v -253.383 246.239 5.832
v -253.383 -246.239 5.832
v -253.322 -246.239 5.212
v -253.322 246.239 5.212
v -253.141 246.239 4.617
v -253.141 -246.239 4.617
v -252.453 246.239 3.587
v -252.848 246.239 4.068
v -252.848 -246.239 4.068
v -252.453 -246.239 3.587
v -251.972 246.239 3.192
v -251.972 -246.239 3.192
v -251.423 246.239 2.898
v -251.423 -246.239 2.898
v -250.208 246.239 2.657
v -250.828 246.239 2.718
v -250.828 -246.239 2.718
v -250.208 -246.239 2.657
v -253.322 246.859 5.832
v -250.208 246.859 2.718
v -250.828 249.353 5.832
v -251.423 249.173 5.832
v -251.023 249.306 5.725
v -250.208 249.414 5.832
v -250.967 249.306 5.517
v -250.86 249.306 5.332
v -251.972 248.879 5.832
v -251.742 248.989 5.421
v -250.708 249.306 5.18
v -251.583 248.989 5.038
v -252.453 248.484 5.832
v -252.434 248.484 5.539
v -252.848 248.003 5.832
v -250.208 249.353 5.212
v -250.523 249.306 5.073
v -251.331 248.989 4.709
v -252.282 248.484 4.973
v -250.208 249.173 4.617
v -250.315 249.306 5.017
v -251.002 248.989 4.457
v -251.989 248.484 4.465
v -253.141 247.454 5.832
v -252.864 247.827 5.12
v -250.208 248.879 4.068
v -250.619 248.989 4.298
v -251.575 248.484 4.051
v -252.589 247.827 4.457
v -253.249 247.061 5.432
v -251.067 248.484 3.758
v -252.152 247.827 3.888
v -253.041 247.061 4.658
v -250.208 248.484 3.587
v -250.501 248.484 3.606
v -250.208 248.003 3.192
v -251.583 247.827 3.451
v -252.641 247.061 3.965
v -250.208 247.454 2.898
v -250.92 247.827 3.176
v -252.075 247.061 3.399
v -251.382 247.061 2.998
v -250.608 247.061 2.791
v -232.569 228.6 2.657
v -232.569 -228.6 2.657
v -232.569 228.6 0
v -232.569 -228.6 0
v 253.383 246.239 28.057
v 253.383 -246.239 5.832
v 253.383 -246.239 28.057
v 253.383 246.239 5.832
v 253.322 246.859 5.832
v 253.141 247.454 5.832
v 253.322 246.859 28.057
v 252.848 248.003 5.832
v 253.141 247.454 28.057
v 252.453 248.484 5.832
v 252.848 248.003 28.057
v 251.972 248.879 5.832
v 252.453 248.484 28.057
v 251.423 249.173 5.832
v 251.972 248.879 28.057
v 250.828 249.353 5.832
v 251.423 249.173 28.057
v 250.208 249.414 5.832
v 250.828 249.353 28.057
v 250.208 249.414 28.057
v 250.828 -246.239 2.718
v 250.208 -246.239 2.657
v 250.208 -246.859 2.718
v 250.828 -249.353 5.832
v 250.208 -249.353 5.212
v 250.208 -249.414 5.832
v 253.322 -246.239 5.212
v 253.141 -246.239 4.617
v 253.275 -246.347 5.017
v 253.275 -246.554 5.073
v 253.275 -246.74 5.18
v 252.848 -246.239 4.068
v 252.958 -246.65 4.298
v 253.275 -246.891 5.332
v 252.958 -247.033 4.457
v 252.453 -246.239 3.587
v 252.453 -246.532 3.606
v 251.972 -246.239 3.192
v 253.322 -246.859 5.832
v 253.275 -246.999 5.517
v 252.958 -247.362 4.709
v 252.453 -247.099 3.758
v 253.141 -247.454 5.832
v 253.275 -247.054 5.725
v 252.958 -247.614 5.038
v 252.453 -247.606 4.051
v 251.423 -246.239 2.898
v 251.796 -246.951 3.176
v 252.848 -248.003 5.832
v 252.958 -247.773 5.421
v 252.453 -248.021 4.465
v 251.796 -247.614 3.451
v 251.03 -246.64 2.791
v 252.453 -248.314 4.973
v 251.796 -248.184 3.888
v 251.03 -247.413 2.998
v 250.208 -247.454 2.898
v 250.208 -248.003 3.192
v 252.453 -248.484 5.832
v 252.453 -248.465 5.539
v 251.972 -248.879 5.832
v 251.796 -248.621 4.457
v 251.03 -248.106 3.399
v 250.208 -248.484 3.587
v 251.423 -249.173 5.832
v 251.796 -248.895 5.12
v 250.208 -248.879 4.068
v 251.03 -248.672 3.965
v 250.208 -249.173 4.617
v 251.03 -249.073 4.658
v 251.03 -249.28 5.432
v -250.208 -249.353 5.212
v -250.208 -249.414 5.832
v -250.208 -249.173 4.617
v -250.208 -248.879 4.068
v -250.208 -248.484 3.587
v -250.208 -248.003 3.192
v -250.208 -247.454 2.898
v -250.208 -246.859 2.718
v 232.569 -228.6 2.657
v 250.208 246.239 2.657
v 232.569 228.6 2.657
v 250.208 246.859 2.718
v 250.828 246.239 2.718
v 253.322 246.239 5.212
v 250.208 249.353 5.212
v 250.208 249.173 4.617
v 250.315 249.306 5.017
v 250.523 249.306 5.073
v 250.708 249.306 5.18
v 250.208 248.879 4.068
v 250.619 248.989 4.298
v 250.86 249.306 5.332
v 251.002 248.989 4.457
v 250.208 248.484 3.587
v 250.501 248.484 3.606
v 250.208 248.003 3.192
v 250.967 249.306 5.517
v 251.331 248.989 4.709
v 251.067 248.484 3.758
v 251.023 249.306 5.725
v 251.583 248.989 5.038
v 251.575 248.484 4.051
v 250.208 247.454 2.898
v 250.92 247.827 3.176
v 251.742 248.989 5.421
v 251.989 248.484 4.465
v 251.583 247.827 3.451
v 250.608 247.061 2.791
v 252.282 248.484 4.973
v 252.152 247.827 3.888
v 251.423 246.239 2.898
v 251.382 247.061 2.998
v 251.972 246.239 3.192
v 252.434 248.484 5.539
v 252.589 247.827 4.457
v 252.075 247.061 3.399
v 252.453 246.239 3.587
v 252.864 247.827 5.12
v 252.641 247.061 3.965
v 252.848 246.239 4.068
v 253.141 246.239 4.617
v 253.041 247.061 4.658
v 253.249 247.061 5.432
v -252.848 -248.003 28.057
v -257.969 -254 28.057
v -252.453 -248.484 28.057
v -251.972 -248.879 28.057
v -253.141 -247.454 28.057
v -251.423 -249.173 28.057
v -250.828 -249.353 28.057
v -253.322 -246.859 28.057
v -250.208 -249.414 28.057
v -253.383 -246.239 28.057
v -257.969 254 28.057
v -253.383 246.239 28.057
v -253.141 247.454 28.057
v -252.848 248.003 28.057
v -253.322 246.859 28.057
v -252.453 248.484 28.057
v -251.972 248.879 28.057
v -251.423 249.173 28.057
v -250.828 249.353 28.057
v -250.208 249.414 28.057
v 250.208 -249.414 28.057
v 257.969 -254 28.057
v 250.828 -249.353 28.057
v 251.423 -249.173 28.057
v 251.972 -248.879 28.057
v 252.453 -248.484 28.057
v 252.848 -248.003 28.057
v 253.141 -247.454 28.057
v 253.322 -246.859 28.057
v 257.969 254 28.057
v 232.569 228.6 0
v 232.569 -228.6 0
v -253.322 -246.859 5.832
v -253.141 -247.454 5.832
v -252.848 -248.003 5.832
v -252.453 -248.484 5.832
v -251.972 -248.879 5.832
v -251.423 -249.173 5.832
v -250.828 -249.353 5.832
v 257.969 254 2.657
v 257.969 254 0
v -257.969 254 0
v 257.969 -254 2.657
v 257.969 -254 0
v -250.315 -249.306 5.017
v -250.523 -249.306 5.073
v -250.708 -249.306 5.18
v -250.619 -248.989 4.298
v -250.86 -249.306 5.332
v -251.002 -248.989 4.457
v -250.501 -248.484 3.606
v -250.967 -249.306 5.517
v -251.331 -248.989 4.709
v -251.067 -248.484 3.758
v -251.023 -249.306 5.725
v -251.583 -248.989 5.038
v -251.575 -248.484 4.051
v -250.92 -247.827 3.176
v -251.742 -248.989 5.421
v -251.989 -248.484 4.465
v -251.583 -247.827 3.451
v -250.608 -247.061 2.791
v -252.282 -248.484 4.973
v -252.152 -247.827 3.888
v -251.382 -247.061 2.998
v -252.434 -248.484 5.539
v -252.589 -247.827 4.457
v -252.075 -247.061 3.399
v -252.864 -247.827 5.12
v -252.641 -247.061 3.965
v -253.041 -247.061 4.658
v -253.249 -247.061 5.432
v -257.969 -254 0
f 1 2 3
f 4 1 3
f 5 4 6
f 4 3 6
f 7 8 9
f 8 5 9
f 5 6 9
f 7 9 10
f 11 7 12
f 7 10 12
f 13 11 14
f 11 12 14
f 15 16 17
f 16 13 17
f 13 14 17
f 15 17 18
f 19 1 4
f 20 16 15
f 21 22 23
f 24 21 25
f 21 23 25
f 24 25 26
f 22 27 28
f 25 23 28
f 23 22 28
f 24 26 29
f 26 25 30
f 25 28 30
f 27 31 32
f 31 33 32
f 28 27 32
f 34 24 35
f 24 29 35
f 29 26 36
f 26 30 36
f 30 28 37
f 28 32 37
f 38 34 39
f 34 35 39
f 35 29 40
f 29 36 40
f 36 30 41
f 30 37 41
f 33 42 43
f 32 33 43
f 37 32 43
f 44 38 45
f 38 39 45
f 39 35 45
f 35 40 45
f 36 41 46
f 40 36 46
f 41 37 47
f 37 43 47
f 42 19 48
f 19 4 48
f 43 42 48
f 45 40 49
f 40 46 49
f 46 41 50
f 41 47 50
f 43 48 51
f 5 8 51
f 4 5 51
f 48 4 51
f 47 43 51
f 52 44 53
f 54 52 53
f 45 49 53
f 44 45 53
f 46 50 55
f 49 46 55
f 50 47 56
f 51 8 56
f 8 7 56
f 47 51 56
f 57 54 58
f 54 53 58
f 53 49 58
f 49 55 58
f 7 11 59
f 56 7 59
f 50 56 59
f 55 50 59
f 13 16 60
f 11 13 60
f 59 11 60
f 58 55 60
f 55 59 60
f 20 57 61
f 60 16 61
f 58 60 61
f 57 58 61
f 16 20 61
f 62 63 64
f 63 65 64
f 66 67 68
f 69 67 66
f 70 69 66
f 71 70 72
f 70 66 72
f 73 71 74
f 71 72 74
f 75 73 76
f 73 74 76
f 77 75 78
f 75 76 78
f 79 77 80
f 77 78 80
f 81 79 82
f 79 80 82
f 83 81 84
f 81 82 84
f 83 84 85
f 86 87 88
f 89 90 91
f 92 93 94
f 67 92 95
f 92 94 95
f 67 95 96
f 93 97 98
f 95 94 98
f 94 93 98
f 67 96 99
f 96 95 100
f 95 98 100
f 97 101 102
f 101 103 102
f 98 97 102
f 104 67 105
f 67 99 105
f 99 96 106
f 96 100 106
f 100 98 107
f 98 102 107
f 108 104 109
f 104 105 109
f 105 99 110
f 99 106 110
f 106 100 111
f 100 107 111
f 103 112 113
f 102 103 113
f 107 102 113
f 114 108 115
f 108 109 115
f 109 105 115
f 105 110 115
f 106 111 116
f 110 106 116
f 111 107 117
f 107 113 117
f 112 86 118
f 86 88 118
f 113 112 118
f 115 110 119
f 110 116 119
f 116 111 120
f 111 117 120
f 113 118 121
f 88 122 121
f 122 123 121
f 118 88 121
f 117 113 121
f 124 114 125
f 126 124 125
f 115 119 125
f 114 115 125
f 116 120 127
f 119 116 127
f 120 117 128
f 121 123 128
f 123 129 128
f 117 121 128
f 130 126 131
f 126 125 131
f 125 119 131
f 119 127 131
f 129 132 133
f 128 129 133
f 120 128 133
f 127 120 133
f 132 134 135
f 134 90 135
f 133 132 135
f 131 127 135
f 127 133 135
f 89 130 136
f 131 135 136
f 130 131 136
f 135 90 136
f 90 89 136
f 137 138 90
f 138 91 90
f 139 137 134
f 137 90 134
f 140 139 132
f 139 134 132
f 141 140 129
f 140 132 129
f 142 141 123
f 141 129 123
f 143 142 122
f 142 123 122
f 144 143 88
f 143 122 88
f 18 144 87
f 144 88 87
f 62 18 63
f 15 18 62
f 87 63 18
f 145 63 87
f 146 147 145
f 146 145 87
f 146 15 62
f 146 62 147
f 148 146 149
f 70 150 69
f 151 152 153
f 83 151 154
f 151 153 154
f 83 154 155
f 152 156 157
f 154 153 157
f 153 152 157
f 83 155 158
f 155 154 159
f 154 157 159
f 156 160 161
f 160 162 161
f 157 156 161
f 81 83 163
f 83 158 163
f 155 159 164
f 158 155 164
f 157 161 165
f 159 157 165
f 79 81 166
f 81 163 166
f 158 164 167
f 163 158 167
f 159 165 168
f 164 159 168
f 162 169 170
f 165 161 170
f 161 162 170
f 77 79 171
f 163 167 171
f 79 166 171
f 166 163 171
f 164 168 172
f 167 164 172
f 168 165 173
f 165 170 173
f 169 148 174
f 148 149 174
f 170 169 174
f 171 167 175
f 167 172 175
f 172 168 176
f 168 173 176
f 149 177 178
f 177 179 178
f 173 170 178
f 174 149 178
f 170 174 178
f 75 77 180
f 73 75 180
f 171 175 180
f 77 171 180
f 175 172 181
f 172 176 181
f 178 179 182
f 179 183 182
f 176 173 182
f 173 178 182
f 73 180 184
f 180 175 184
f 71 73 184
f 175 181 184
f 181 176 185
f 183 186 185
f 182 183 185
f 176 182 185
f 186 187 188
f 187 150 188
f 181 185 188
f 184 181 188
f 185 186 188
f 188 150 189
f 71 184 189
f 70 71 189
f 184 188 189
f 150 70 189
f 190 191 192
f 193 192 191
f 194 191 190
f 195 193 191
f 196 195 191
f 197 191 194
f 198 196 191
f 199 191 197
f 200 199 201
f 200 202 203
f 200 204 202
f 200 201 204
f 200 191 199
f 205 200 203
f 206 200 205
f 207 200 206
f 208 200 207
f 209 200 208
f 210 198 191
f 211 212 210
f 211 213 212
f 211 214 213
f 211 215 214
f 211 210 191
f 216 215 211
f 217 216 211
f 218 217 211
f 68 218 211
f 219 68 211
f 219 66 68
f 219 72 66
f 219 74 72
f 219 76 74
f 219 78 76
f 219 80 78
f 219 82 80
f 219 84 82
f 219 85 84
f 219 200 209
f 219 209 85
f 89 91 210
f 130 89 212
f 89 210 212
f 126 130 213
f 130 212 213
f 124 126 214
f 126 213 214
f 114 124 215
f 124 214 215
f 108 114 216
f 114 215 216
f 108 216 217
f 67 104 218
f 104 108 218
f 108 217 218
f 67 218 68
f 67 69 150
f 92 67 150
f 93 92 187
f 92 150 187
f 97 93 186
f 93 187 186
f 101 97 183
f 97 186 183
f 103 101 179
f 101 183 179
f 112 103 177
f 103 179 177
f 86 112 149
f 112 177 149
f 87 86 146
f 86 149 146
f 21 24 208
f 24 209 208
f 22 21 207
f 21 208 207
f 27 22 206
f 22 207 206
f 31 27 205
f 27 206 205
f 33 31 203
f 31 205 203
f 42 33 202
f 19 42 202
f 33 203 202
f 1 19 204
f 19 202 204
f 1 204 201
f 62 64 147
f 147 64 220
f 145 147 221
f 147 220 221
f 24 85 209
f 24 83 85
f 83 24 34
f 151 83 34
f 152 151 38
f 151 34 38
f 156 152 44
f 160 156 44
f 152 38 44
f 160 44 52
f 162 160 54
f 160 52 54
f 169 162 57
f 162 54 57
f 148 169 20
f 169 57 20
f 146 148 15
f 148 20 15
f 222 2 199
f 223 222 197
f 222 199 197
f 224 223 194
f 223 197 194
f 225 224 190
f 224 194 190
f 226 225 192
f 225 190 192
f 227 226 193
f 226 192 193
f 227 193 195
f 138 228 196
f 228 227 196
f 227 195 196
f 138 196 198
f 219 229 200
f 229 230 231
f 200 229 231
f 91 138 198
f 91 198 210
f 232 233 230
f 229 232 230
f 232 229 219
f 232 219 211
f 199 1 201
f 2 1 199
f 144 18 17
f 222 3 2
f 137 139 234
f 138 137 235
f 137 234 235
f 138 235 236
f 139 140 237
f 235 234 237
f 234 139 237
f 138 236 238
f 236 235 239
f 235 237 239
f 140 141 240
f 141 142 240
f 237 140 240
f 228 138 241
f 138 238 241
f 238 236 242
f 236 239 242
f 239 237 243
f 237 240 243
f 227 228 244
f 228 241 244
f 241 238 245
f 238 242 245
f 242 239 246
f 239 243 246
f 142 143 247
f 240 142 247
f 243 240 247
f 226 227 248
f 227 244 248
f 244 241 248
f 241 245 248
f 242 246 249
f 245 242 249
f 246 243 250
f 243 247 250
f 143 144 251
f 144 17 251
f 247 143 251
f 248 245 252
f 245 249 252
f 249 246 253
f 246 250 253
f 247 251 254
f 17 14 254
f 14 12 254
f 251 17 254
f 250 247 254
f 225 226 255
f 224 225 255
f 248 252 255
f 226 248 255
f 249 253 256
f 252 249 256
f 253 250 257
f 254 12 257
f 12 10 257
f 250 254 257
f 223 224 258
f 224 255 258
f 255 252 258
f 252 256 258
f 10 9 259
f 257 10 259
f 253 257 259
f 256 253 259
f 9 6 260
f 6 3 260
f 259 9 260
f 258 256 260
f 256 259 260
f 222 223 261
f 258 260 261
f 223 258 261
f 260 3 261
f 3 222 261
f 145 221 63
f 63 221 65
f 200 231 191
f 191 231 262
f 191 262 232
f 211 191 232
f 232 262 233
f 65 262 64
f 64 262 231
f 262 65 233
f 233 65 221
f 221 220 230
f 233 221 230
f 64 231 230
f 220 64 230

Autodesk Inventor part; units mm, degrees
ref_plane "YZ Plane" through (0, 0, 0) normal (1, 0, 0) x (0, 1, 0)
ref_plane "XZ Plane" through (0, 0, 0) normal (0, 1, 0) x (-1, 0, 0)
ref_plane "XY Plane" through (0, 0, 0) normal (0, 0, 1) x (1, 0, 0)
sketch "Sketch1" plane through (0, 0, 0) normal (0, 0, 1) x (1, 0, 0)
  line L0 (-257.9687, -254) -> (257.9688, -254)
  line L1 (257.9688, -254) -> (257.9687, 254)
  line L2 (257.9687, 254) -> (-257.9688, 254)
  line L3 (-257.9688, 254) -> (-257.9687, -254)
  line L4 (-257.9687, -254) -> (257.9687, 254) construction
  line L5 (257.9688, -254) -> (-257.9688, 254) construction
  line L6 (232.5688, -228.6) -> (-232.5687, -228.6)
  line L7 (-232.5687, -228.6) -> (-232.5688, 228.6)
  line L8 (-232.5688, 228.6) -> (232.5687, 228.6)
  line L9 (232.5687, 228.6) -> (232.5688, -228.6)
  point P0 (0, 0)
  dimension "d0" = 515.9375
  dimension "d1" = 508
  dimension "d2" = 25.4
extrude "Extrusion1" add sketch "Sketch1" along normal blind 2.6568
sketch "Sketch2" plane through (0, 0, 2.6568) normal (0, 0, 1) x (1, 0, 0)
  line L0 (-257.9688, 254) -> (-257.9687, -254) projected
  line L1 (-257.9688, 254) -> (257.9688, 254)
  line L2 (257.9688, 254) -> (257.9688, -254)
  line L3 (257.9688, -254) -> (-257.9688, -254)
  line L4 (-257.9688, -254) -> (-257.9688, 254)
  line L5 (-253.3831, -249.4144) -> (253.3831, -249.4144)
  line L6 (253.3831, -249.4144) -> (253.3831, 249.4144)
  line L7 (253.3831, 249.4144) -> (-253.3831, 249.4144)
  line L8 (-253.3831, 249.4144) -> (-253.3831, -249.4144)
  point P0 (0, 0)
extrude "Extrusion2" add sketch "Sketch2" along normal blind 25.4
fillet "Fillet1" radius 3.175 8 edges at (-253.3831, 0, 2.6568) (0, -249.4144, 2.6568) (-253.3831, -249.4144, 15.3568) (253.3831, 0, 2.6568) (253.3831, -249.4144, 15.3568) (0, 249.4144, 2.6568) (253.3831, 249.4144, 15.3568) (-253.3831, 249.4144, 15.3568)
properties part number "rackBase"
